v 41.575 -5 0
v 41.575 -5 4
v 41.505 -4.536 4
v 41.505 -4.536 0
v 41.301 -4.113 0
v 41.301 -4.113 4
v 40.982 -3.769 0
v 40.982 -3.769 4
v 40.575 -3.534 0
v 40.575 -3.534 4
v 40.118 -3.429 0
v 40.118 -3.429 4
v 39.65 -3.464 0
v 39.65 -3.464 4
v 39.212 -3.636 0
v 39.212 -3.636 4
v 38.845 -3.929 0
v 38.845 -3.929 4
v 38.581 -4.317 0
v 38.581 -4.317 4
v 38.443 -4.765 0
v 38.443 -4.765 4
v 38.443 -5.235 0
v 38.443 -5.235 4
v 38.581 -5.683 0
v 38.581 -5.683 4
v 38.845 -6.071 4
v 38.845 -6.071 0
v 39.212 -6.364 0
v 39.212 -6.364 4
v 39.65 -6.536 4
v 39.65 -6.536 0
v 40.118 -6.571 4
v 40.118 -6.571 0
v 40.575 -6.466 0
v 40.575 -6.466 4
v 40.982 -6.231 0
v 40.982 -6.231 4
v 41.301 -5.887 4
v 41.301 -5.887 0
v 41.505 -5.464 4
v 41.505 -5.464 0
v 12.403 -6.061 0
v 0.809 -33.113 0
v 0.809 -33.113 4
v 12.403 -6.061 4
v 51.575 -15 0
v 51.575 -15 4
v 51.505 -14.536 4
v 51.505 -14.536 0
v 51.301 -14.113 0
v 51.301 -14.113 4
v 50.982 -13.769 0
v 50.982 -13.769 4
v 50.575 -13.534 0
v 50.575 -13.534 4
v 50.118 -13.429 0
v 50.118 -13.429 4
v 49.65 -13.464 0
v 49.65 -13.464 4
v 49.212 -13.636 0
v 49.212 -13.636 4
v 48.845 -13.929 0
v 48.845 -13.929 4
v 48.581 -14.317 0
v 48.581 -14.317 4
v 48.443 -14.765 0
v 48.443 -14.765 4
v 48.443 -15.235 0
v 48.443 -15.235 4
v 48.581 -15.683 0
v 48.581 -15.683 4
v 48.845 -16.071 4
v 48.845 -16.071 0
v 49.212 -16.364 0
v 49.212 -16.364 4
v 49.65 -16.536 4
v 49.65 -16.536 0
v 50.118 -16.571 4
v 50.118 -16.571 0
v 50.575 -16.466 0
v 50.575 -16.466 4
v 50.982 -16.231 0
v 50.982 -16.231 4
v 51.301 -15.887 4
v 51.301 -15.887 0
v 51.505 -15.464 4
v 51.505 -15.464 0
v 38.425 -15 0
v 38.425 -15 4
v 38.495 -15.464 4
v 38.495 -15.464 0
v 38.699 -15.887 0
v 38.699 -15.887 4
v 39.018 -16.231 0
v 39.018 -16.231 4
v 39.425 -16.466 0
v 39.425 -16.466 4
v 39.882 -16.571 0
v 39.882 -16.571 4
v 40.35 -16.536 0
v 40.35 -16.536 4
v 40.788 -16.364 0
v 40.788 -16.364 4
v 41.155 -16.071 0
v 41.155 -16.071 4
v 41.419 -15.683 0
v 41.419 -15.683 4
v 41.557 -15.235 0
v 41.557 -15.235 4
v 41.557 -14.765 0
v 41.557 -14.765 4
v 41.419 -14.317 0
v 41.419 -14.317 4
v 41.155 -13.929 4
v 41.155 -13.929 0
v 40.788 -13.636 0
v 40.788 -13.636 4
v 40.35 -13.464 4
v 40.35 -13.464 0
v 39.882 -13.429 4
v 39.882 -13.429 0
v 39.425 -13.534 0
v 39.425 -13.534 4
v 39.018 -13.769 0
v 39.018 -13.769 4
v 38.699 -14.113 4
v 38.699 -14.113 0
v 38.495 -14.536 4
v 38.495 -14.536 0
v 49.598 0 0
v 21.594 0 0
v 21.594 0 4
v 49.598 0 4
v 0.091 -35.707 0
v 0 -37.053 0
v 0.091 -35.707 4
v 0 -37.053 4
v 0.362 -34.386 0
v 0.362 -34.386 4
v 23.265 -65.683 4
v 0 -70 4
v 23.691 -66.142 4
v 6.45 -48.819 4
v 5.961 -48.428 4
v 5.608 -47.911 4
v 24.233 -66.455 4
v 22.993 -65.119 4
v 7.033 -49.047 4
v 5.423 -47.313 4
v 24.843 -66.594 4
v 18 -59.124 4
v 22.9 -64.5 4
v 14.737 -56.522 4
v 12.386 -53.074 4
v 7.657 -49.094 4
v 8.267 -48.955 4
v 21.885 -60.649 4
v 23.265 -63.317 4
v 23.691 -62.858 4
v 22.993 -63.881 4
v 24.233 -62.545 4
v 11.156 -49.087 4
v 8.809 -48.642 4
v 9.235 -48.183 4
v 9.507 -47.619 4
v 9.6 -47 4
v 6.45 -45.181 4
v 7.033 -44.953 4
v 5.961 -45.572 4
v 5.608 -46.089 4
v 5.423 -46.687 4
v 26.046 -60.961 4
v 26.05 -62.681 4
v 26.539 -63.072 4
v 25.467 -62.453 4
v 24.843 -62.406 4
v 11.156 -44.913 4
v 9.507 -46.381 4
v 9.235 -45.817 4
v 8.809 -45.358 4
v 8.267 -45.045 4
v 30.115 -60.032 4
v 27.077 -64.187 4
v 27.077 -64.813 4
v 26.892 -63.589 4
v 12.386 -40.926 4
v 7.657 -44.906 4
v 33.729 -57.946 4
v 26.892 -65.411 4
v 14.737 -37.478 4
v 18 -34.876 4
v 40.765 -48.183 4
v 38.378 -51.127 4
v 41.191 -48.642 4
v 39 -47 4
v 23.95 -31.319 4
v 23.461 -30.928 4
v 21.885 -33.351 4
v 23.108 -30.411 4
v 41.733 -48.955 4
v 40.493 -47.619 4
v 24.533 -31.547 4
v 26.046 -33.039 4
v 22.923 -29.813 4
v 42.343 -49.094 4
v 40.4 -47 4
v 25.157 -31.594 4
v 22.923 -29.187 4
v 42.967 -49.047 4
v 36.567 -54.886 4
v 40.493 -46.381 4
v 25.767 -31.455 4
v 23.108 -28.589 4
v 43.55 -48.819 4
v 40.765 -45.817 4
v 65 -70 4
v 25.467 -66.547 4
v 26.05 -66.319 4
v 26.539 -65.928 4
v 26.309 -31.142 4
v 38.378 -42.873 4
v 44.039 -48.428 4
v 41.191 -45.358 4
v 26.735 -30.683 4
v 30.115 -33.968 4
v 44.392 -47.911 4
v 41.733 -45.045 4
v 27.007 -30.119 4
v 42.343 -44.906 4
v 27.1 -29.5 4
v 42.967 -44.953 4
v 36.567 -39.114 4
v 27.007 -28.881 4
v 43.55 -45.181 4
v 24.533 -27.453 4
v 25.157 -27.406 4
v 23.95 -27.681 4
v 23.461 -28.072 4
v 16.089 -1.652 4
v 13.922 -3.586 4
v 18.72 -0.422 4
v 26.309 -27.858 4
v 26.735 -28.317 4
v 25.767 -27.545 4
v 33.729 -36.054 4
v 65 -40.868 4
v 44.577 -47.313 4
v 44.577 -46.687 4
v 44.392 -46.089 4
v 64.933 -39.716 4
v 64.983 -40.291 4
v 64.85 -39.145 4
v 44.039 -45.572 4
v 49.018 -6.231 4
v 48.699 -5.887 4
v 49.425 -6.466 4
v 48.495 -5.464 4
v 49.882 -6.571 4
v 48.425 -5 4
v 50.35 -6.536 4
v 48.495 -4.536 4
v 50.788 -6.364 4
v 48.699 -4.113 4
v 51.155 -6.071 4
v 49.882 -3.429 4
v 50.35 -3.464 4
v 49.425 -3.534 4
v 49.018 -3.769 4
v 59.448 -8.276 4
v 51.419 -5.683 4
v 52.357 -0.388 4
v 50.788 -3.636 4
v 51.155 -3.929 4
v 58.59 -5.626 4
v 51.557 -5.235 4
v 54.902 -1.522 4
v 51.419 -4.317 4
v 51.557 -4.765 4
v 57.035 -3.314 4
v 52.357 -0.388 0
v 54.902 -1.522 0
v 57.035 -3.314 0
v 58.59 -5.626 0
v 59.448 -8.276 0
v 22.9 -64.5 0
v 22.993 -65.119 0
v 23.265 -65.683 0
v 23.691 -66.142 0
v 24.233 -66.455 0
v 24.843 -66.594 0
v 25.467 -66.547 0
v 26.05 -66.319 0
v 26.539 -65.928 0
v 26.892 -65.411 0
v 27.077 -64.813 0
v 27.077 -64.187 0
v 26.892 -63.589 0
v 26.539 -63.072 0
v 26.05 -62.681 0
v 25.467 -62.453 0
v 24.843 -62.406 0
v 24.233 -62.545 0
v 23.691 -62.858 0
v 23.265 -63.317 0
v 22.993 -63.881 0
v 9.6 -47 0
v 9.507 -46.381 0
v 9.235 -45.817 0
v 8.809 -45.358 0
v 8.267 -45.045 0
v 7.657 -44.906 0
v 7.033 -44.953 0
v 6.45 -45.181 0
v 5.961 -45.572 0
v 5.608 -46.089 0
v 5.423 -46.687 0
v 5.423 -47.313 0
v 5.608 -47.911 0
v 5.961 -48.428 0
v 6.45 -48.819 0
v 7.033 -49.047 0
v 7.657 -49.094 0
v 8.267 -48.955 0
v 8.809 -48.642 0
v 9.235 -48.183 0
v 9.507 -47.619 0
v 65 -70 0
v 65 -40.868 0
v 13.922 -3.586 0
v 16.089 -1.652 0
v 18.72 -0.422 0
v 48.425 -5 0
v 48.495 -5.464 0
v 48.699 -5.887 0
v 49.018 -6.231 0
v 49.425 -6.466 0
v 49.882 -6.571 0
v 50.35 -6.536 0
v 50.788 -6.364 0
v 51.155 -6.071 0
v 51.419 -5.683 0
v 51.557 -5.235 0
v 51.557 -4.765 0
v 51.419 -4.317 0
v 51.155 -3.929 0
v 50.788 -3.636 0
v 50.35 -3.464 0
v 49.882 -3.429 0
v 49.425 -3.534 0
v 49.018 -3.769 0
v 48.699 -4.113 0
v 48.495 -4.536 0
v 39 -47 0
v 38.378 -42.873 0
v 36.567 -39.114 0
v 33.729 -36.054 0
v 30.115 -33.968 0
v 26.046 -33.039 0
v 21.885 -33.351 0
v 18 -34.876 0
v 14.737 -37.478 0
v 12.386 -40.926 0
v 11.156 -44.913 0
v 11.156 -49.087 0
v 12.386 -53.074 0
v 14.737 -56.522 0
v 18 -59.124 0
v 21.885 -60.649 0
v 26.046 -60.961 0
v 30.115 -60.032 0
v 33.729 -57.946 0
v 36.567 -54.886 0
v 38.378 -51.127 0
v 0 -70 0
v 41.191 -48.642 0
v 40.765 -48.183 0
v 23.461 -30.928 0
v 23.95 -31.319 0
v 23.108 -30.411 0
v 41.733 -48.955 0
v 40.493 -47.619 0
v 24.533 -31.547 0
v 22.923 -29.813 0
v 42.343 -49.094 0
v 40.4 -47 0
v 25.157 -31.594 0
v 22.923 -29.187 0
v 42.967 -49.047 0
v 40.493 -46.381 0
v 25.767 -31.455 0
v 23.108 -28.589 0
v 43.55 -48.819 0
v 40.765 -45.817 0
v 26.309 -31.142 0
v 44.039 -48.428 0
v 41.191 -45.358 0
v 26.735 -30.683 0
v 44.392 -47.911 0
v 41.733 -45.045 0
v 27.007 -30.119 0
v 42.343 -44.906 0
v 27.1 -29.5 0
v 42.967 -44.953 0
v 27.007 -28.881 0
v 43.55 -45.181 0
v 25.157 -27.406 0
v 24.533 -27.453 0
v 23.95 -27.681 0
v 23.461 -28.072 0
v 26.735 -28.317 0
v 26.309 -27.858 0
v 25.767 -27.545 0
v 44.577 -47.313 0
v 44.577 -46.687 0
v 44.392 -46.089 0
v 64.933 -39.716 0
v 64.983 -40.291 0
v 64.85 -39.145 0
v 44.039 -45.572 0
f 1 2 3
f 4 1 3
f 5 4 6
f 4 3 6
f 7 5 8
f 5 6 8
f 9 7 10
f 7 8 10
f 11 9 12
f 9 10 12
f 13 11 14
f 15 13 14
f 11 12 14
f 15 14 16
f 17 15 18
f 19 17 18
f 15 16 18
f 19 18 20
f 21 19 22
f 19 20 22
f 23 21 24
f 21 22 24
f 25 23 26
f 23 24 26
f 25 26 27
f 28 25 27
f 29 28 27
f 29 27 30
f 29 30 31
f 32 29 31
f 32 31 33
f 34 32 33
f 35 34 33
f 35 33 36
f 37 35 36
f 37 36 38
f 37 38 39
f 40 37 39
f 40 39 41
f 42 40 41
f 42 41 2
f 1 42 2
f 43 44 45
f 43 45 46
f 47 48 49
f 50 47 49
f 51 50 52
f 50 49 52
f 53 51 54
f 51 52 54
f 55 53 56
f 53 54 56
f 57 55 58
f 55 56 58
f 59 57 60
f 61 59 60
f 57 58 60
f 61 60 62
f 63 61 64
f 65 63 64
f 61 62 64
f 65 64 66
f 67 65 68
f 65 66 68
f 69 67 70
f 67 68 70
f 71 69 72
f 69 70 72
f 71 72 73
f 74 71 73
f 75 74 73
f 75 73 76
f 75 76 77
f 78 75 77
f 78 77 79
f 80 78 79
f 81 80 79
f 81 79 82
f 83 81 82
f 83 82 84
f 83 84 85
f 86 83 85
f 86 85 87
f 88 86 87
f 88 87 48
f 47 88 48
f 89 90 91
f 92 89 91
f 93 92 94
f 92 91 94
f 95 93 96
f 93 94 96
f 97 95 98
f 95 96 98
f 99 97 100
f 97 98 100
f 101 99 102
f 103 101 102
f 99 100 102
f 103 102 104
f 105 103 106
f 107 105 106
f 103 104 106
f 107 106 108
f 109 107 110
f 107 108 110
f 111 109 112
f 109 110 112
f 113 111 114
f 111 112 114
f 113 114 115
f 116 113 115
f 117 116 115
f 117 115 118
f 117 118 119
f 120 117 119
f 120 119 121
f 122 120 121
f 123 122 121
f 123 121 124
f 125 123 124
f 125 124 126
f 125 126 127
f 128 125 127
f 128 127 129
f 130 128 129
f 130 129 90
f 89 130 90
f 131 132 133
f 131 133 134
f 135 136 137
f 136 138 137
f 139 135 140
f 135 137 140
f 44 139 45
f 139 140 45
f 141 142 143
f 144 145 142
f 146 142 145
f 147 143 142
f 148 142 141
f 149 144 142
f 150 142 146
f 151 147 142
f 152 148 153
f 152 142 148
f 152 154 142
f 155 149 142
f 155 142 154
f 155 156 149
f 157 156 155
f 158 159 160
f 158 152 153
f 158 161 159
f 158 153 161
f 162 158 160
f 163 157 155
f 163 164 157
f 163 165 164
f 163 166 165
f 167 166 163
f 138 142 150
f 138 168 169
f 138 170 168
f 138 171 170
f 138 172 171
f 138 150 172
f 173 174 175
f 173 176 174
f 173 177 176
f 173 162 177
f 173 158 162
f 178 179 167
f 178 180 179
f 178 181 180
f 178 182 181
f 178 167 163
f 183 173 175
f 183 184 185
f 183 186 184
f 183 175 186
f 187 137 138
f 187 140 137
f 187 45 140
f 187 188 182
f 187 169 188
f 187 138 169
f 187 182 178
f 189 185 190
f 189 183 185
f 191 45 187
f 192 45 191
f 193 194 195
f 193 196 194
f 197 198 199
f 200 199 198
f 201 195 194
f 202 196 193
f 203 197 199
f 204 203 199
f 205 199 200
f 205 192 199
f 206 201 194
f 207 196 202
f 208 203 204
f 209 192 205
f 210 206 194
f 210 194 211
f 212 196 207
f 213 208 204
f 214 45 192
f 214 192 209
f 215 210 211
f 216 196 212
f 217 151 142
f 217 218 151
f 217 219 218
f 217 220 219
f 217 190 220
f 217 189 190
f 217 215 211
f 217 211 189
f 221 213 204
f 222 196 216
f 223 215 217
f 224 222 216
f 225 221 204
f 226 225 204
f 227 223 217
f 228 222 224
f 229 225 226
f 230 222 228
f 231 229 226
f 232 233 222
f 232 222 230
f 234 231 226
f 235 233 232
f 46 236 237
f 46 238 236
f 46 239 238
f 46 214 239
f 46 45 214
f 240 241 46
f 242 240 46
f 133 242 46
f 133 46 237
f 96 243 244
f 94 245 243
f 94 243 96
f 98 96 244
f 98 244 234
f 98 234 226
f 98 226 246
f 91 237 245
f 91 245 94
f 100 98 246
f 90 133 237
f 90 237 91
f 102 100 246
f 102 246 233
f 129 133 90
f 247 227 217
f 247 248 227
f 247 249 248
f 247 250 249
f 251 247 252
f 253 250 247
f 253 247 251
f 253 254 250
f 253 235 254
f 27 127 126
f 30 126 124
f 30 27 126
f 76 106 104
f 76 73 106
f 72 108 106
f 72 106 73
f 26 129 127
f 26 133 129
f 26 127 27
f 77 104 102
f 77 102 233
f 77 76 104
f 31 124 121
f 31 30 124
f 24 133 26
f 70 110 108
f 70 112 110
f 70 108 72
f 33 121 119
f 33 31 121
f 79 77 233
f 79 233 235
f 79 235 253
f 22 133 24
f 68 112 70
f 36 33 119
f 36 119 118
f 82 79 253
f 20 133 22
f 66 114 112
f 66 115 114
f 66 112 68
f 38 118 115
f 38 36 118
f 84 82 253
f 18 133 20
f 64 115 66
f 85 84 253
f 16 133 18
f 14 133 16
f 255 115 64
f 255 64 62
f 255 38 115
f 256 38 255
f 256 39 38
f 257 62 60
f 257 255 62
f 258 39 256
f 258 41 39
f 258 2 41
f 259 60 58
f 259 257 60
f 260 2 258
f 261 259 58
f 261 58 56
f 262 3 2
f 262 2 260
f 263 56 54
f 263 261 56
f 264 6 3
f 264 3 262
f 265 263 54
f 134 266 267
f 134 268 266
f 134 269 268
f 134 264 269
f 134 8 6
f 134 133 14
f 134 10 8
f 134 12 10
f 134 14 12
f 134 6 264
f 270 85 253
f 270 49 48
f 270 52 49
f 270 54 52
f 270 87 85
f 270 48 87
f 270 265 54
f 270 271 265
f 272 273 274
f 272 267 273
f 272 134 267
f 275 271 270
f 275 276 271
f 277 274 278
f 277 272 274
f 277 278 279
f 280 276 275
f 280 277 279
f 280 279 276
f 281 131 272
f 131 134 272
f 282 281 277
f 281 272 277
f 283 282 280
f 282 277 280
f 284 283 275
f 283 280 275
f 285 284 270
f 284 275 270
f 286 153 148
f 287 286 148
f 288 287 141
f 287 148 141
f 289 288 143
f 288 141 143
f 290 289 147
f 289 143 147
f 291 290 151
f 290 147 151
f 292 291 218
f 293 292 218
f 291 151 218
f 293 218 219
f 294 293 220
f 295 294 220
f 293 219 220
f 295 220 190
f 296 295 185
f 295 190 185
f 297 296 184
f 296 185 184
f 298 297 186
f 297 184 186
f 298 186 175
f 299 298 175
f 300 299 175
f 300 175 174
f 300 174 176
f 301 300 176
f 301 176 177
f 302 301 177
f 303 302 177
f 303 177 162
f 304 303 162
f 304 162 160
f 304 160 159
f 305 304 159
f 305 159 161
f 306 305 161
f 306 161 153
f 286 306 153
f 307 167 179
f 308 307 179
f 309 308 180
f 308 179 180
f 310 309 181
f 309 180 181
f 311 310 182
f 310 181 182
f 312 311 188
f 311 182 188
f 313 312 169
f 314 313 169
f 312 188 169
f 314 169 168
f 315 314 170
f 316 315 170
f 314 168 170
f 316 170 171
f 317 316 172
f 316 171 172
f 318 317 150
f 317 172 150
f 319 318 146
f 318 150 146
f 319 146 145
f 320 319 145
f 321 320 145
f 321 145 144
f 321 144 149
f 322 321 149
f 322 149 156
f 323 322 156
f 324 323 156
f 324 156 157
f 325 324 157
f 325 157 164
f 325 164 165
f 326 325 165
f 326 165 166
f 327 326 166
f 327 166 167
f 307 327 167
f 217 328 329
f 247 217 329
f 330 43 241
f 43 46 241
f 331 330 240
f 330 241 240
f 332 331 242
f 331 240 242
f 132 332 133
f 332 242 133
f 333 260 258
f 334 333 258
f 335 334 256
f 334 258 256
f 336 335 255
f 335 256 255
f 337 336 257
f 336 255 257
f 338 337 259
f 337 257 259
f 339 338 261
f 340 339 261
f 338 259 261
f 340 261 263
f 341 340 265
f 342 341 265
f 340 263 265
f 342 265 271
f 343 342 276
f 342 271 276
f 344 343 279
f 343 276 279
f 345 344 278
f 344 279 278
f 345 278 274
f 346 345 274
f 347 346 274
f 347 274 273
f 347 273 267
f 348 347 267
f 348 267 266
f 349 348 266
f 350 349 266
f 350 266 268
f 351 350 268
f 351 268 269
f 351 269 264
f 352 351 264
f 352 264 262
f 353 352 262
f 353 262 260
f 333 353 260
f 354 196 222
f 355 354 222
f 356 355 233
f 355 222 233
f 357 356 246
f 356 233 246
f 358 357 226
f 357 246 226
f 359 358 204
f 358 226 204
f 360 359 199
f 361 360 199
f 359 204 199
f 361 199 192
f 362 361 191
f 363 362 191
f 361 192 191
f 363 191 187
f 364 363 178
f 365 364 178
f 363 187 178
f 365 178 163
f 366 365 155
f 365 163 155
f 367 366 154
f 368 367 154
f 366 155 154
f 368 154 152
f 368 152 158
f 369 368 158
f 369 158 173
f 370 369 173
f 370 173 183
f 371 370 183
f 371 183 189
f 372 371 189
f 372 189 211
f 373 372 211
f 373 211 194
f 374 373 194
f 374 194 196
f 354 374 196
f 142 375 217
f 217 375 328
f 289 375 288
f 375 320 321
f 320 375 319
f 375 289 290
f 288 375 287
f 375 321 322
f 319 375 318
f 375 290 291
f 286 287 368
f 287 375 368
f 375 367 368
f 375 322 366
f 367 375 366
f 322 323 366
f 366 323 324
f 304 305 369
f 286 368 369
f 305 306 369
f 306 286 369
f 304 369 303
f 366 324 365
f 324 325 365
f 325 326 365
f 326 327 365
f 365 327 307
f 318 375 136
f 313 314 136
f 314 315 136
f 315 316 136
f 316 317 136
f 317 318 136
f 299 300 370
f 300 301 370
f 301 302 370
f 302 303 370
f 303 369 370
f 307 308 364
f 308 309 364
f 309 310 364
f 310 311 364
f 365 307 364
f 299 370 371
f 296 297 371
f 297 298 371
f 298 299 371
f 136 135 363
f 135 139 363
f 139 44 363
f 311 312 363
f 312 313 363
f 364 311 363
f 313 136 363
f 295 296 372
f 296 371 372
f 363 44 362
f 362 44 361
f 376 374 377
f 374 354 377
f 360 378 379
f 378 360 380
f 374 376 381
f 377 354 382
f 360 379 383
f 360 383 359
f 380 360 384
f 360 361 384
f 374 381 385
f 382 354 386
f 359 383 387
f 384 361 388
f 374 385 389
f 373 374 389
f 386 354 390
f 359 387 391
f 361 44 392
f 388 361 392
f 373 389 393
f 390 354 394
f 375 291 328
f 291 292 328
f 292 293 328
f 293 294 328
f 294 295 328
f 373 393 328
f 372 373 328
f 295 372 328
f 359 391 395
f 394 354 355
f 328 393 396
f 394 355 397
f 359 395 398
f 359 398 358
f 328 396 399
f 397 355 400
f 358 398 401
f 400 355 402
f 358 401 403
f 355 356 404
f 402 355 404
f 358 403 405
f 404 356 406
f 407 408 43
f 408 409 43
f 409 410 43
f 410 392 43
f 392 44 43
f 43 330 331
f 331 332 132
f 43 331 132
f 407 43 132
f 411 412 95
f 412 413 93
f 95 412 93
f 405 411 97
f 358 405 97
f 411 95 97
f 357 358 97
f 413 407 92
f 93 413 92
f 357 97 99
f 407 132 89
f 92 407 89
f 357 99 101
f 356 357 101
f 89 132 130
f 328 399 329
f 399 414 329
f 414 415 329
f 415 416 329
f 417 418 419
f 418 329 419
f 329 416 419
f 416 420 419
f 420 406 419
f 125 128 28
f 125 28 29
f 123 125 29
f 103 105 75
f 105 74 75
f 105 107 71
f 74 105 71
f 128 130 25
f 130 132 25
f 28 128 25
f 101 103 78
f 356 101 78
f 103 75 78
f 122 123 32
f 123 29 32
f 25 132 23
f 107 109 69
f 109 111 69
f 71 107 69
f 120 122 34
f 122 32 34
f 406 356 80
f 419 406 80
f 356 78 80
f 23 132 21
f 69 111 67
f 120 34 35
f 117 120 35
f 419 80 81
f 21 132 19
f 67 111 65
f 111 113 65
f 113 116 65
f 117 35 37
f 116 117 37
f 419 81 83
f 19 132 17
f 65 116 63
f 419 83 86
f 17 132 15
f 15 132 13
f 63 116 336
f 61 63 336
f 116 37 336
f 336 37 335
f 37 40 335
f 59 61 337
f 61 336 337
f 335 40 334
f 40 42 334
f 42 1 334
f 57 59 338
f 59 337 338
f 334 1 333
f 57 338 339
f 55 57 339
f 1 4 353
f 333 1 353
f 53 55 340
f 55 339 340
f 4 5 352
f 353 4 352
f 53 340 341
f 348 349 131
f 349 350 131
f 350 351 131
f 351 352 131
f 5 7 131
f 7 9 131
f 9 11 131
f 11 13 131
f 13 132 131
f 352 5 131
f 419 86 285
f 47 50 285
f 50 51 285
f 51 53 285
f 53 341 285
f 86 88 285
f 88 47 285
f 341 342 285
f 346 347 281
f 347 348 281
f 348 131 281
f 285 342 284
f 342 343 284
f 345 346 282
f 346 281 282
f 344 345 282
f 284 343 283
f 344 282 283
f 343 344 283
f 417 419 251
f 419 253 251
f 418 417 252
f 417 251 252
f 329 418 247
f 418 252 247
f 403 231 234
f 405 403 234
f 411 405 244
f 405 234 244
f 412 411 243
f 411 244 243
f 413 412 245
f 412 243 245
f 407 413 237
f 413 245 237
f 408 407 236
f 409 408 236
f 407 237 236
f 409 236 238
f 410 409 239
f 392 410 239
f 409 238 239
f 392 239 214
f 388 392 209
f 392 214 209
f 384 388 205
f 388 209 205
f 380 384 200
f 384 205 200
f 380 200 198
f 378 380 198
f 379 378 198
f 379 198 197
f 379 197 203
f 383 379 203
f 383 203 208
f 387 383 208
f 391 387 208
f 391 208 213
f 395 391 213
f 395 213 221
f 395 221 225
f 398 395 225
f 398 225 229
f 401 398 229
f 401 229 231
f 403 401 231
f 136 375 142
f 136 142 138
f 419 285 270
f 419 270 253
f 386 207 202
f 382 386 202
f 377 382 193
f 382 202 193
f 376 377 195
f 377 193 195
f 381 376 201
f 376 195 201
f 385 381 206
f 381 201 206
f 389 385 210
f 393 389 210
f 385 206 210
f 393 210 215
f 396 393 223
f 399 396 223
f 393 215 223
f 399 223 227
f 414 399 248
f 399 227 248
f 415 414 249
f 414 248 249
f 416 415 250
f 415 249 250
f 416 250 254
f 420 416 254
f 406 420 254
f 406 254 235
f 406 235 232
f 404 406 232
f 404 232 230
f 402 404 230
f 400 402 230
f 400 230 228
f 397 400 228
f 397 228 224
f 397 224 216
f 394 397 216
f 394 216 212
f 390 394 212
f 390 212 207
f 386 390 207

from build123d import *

# Parameters (mm, degrees)
SKETCH_1_W          = 65
SKETCH_1_H          = 70
EXTRUDE_1_DEPTH     = 4
SKETCH_2_R          = 2.1
SKETCH_2_R_2        = 1.575
SKETCH_2_R_3        = 14
CUT_EXTRUDE_1_DEPTH = 96.608577021
CUT_EXTRUDE_2_DEPTH = 96.608577021
FILLET_1_R          = 10


with BuildPart() as part:
    # 草图1 → 凸台-拉伸1 (new body)
    with BuildSketch(Plane.XY):
        with Locations((32.5, -35)):
            Rectangle(SKETCH_1_W, SKETCH_1_H)
    extrude(amount=EXTRUDE_1_DEPTH)

    # 草图2 → 切除-拉伸1 (cut, through all)
    with BuildSketch(Plane.XY.offset(4)):
        with Locations((25, -29.5)):
            Circle(SKETCH_2_R)
        with Locations((7.5, -47)):
            Circle(SKETCH_2_R)
        with Locations(Location((25, -64.5, 0), (0, 0, 180))):
            Circle(SKETCH_2_R)
        with Locations(Location((42.5, -47, 0), (0, 0, 180))):
            Circle(SKETCH_2_R)
        with Locations((40, -5)):
            Circle(SKETCH_2_R_2)
        with Locations(Location((50, -5, 0), (0, 0, 180))):
            Circle(SKETCH_2_R_2)
        with Locations((50, -15)):
            Circle(SKETCH_2_R_2)
        with Locations(Location((40, -15, 0), (0, 0, 180))):
            Circle(SKETCH_2_R_2)
        with Locations((25, -47)):
            Circle(SKETCH_2_R_3)
    extrude(amount=-CUT_EXTRUDE_1_DEPTH, mode=Mode.SUBTRACT)

    # 草图3 → 切除-拉伸2 (cut, through all)
    with BuildSketch(Plane(origin=(0, 0, 0), x_dir=(-1, 0, 0), z_dir=(0, 0, -1))):
        Polygon((-15, 0), (0, 0), (0, -35), align=None)
        Polygon((-65, 0), (-58, 0), (-65, -40), align=None)
    extrude(amount=-CUT_EXTRUDE_2_DEPTH, mode=Mode.SUBTRACT)

    # 圆角1
    fillet_1_edges = [part.edges().sort_by_distance(p)[0] for p in [
        (0, -35, 2),
        (15, 0, 2),
        (65, -40, 2),
        (58, 0, 2),
    ]]
    fillet(fillet_1_edges, radius=FILLET_1_R)


solid = part.part
